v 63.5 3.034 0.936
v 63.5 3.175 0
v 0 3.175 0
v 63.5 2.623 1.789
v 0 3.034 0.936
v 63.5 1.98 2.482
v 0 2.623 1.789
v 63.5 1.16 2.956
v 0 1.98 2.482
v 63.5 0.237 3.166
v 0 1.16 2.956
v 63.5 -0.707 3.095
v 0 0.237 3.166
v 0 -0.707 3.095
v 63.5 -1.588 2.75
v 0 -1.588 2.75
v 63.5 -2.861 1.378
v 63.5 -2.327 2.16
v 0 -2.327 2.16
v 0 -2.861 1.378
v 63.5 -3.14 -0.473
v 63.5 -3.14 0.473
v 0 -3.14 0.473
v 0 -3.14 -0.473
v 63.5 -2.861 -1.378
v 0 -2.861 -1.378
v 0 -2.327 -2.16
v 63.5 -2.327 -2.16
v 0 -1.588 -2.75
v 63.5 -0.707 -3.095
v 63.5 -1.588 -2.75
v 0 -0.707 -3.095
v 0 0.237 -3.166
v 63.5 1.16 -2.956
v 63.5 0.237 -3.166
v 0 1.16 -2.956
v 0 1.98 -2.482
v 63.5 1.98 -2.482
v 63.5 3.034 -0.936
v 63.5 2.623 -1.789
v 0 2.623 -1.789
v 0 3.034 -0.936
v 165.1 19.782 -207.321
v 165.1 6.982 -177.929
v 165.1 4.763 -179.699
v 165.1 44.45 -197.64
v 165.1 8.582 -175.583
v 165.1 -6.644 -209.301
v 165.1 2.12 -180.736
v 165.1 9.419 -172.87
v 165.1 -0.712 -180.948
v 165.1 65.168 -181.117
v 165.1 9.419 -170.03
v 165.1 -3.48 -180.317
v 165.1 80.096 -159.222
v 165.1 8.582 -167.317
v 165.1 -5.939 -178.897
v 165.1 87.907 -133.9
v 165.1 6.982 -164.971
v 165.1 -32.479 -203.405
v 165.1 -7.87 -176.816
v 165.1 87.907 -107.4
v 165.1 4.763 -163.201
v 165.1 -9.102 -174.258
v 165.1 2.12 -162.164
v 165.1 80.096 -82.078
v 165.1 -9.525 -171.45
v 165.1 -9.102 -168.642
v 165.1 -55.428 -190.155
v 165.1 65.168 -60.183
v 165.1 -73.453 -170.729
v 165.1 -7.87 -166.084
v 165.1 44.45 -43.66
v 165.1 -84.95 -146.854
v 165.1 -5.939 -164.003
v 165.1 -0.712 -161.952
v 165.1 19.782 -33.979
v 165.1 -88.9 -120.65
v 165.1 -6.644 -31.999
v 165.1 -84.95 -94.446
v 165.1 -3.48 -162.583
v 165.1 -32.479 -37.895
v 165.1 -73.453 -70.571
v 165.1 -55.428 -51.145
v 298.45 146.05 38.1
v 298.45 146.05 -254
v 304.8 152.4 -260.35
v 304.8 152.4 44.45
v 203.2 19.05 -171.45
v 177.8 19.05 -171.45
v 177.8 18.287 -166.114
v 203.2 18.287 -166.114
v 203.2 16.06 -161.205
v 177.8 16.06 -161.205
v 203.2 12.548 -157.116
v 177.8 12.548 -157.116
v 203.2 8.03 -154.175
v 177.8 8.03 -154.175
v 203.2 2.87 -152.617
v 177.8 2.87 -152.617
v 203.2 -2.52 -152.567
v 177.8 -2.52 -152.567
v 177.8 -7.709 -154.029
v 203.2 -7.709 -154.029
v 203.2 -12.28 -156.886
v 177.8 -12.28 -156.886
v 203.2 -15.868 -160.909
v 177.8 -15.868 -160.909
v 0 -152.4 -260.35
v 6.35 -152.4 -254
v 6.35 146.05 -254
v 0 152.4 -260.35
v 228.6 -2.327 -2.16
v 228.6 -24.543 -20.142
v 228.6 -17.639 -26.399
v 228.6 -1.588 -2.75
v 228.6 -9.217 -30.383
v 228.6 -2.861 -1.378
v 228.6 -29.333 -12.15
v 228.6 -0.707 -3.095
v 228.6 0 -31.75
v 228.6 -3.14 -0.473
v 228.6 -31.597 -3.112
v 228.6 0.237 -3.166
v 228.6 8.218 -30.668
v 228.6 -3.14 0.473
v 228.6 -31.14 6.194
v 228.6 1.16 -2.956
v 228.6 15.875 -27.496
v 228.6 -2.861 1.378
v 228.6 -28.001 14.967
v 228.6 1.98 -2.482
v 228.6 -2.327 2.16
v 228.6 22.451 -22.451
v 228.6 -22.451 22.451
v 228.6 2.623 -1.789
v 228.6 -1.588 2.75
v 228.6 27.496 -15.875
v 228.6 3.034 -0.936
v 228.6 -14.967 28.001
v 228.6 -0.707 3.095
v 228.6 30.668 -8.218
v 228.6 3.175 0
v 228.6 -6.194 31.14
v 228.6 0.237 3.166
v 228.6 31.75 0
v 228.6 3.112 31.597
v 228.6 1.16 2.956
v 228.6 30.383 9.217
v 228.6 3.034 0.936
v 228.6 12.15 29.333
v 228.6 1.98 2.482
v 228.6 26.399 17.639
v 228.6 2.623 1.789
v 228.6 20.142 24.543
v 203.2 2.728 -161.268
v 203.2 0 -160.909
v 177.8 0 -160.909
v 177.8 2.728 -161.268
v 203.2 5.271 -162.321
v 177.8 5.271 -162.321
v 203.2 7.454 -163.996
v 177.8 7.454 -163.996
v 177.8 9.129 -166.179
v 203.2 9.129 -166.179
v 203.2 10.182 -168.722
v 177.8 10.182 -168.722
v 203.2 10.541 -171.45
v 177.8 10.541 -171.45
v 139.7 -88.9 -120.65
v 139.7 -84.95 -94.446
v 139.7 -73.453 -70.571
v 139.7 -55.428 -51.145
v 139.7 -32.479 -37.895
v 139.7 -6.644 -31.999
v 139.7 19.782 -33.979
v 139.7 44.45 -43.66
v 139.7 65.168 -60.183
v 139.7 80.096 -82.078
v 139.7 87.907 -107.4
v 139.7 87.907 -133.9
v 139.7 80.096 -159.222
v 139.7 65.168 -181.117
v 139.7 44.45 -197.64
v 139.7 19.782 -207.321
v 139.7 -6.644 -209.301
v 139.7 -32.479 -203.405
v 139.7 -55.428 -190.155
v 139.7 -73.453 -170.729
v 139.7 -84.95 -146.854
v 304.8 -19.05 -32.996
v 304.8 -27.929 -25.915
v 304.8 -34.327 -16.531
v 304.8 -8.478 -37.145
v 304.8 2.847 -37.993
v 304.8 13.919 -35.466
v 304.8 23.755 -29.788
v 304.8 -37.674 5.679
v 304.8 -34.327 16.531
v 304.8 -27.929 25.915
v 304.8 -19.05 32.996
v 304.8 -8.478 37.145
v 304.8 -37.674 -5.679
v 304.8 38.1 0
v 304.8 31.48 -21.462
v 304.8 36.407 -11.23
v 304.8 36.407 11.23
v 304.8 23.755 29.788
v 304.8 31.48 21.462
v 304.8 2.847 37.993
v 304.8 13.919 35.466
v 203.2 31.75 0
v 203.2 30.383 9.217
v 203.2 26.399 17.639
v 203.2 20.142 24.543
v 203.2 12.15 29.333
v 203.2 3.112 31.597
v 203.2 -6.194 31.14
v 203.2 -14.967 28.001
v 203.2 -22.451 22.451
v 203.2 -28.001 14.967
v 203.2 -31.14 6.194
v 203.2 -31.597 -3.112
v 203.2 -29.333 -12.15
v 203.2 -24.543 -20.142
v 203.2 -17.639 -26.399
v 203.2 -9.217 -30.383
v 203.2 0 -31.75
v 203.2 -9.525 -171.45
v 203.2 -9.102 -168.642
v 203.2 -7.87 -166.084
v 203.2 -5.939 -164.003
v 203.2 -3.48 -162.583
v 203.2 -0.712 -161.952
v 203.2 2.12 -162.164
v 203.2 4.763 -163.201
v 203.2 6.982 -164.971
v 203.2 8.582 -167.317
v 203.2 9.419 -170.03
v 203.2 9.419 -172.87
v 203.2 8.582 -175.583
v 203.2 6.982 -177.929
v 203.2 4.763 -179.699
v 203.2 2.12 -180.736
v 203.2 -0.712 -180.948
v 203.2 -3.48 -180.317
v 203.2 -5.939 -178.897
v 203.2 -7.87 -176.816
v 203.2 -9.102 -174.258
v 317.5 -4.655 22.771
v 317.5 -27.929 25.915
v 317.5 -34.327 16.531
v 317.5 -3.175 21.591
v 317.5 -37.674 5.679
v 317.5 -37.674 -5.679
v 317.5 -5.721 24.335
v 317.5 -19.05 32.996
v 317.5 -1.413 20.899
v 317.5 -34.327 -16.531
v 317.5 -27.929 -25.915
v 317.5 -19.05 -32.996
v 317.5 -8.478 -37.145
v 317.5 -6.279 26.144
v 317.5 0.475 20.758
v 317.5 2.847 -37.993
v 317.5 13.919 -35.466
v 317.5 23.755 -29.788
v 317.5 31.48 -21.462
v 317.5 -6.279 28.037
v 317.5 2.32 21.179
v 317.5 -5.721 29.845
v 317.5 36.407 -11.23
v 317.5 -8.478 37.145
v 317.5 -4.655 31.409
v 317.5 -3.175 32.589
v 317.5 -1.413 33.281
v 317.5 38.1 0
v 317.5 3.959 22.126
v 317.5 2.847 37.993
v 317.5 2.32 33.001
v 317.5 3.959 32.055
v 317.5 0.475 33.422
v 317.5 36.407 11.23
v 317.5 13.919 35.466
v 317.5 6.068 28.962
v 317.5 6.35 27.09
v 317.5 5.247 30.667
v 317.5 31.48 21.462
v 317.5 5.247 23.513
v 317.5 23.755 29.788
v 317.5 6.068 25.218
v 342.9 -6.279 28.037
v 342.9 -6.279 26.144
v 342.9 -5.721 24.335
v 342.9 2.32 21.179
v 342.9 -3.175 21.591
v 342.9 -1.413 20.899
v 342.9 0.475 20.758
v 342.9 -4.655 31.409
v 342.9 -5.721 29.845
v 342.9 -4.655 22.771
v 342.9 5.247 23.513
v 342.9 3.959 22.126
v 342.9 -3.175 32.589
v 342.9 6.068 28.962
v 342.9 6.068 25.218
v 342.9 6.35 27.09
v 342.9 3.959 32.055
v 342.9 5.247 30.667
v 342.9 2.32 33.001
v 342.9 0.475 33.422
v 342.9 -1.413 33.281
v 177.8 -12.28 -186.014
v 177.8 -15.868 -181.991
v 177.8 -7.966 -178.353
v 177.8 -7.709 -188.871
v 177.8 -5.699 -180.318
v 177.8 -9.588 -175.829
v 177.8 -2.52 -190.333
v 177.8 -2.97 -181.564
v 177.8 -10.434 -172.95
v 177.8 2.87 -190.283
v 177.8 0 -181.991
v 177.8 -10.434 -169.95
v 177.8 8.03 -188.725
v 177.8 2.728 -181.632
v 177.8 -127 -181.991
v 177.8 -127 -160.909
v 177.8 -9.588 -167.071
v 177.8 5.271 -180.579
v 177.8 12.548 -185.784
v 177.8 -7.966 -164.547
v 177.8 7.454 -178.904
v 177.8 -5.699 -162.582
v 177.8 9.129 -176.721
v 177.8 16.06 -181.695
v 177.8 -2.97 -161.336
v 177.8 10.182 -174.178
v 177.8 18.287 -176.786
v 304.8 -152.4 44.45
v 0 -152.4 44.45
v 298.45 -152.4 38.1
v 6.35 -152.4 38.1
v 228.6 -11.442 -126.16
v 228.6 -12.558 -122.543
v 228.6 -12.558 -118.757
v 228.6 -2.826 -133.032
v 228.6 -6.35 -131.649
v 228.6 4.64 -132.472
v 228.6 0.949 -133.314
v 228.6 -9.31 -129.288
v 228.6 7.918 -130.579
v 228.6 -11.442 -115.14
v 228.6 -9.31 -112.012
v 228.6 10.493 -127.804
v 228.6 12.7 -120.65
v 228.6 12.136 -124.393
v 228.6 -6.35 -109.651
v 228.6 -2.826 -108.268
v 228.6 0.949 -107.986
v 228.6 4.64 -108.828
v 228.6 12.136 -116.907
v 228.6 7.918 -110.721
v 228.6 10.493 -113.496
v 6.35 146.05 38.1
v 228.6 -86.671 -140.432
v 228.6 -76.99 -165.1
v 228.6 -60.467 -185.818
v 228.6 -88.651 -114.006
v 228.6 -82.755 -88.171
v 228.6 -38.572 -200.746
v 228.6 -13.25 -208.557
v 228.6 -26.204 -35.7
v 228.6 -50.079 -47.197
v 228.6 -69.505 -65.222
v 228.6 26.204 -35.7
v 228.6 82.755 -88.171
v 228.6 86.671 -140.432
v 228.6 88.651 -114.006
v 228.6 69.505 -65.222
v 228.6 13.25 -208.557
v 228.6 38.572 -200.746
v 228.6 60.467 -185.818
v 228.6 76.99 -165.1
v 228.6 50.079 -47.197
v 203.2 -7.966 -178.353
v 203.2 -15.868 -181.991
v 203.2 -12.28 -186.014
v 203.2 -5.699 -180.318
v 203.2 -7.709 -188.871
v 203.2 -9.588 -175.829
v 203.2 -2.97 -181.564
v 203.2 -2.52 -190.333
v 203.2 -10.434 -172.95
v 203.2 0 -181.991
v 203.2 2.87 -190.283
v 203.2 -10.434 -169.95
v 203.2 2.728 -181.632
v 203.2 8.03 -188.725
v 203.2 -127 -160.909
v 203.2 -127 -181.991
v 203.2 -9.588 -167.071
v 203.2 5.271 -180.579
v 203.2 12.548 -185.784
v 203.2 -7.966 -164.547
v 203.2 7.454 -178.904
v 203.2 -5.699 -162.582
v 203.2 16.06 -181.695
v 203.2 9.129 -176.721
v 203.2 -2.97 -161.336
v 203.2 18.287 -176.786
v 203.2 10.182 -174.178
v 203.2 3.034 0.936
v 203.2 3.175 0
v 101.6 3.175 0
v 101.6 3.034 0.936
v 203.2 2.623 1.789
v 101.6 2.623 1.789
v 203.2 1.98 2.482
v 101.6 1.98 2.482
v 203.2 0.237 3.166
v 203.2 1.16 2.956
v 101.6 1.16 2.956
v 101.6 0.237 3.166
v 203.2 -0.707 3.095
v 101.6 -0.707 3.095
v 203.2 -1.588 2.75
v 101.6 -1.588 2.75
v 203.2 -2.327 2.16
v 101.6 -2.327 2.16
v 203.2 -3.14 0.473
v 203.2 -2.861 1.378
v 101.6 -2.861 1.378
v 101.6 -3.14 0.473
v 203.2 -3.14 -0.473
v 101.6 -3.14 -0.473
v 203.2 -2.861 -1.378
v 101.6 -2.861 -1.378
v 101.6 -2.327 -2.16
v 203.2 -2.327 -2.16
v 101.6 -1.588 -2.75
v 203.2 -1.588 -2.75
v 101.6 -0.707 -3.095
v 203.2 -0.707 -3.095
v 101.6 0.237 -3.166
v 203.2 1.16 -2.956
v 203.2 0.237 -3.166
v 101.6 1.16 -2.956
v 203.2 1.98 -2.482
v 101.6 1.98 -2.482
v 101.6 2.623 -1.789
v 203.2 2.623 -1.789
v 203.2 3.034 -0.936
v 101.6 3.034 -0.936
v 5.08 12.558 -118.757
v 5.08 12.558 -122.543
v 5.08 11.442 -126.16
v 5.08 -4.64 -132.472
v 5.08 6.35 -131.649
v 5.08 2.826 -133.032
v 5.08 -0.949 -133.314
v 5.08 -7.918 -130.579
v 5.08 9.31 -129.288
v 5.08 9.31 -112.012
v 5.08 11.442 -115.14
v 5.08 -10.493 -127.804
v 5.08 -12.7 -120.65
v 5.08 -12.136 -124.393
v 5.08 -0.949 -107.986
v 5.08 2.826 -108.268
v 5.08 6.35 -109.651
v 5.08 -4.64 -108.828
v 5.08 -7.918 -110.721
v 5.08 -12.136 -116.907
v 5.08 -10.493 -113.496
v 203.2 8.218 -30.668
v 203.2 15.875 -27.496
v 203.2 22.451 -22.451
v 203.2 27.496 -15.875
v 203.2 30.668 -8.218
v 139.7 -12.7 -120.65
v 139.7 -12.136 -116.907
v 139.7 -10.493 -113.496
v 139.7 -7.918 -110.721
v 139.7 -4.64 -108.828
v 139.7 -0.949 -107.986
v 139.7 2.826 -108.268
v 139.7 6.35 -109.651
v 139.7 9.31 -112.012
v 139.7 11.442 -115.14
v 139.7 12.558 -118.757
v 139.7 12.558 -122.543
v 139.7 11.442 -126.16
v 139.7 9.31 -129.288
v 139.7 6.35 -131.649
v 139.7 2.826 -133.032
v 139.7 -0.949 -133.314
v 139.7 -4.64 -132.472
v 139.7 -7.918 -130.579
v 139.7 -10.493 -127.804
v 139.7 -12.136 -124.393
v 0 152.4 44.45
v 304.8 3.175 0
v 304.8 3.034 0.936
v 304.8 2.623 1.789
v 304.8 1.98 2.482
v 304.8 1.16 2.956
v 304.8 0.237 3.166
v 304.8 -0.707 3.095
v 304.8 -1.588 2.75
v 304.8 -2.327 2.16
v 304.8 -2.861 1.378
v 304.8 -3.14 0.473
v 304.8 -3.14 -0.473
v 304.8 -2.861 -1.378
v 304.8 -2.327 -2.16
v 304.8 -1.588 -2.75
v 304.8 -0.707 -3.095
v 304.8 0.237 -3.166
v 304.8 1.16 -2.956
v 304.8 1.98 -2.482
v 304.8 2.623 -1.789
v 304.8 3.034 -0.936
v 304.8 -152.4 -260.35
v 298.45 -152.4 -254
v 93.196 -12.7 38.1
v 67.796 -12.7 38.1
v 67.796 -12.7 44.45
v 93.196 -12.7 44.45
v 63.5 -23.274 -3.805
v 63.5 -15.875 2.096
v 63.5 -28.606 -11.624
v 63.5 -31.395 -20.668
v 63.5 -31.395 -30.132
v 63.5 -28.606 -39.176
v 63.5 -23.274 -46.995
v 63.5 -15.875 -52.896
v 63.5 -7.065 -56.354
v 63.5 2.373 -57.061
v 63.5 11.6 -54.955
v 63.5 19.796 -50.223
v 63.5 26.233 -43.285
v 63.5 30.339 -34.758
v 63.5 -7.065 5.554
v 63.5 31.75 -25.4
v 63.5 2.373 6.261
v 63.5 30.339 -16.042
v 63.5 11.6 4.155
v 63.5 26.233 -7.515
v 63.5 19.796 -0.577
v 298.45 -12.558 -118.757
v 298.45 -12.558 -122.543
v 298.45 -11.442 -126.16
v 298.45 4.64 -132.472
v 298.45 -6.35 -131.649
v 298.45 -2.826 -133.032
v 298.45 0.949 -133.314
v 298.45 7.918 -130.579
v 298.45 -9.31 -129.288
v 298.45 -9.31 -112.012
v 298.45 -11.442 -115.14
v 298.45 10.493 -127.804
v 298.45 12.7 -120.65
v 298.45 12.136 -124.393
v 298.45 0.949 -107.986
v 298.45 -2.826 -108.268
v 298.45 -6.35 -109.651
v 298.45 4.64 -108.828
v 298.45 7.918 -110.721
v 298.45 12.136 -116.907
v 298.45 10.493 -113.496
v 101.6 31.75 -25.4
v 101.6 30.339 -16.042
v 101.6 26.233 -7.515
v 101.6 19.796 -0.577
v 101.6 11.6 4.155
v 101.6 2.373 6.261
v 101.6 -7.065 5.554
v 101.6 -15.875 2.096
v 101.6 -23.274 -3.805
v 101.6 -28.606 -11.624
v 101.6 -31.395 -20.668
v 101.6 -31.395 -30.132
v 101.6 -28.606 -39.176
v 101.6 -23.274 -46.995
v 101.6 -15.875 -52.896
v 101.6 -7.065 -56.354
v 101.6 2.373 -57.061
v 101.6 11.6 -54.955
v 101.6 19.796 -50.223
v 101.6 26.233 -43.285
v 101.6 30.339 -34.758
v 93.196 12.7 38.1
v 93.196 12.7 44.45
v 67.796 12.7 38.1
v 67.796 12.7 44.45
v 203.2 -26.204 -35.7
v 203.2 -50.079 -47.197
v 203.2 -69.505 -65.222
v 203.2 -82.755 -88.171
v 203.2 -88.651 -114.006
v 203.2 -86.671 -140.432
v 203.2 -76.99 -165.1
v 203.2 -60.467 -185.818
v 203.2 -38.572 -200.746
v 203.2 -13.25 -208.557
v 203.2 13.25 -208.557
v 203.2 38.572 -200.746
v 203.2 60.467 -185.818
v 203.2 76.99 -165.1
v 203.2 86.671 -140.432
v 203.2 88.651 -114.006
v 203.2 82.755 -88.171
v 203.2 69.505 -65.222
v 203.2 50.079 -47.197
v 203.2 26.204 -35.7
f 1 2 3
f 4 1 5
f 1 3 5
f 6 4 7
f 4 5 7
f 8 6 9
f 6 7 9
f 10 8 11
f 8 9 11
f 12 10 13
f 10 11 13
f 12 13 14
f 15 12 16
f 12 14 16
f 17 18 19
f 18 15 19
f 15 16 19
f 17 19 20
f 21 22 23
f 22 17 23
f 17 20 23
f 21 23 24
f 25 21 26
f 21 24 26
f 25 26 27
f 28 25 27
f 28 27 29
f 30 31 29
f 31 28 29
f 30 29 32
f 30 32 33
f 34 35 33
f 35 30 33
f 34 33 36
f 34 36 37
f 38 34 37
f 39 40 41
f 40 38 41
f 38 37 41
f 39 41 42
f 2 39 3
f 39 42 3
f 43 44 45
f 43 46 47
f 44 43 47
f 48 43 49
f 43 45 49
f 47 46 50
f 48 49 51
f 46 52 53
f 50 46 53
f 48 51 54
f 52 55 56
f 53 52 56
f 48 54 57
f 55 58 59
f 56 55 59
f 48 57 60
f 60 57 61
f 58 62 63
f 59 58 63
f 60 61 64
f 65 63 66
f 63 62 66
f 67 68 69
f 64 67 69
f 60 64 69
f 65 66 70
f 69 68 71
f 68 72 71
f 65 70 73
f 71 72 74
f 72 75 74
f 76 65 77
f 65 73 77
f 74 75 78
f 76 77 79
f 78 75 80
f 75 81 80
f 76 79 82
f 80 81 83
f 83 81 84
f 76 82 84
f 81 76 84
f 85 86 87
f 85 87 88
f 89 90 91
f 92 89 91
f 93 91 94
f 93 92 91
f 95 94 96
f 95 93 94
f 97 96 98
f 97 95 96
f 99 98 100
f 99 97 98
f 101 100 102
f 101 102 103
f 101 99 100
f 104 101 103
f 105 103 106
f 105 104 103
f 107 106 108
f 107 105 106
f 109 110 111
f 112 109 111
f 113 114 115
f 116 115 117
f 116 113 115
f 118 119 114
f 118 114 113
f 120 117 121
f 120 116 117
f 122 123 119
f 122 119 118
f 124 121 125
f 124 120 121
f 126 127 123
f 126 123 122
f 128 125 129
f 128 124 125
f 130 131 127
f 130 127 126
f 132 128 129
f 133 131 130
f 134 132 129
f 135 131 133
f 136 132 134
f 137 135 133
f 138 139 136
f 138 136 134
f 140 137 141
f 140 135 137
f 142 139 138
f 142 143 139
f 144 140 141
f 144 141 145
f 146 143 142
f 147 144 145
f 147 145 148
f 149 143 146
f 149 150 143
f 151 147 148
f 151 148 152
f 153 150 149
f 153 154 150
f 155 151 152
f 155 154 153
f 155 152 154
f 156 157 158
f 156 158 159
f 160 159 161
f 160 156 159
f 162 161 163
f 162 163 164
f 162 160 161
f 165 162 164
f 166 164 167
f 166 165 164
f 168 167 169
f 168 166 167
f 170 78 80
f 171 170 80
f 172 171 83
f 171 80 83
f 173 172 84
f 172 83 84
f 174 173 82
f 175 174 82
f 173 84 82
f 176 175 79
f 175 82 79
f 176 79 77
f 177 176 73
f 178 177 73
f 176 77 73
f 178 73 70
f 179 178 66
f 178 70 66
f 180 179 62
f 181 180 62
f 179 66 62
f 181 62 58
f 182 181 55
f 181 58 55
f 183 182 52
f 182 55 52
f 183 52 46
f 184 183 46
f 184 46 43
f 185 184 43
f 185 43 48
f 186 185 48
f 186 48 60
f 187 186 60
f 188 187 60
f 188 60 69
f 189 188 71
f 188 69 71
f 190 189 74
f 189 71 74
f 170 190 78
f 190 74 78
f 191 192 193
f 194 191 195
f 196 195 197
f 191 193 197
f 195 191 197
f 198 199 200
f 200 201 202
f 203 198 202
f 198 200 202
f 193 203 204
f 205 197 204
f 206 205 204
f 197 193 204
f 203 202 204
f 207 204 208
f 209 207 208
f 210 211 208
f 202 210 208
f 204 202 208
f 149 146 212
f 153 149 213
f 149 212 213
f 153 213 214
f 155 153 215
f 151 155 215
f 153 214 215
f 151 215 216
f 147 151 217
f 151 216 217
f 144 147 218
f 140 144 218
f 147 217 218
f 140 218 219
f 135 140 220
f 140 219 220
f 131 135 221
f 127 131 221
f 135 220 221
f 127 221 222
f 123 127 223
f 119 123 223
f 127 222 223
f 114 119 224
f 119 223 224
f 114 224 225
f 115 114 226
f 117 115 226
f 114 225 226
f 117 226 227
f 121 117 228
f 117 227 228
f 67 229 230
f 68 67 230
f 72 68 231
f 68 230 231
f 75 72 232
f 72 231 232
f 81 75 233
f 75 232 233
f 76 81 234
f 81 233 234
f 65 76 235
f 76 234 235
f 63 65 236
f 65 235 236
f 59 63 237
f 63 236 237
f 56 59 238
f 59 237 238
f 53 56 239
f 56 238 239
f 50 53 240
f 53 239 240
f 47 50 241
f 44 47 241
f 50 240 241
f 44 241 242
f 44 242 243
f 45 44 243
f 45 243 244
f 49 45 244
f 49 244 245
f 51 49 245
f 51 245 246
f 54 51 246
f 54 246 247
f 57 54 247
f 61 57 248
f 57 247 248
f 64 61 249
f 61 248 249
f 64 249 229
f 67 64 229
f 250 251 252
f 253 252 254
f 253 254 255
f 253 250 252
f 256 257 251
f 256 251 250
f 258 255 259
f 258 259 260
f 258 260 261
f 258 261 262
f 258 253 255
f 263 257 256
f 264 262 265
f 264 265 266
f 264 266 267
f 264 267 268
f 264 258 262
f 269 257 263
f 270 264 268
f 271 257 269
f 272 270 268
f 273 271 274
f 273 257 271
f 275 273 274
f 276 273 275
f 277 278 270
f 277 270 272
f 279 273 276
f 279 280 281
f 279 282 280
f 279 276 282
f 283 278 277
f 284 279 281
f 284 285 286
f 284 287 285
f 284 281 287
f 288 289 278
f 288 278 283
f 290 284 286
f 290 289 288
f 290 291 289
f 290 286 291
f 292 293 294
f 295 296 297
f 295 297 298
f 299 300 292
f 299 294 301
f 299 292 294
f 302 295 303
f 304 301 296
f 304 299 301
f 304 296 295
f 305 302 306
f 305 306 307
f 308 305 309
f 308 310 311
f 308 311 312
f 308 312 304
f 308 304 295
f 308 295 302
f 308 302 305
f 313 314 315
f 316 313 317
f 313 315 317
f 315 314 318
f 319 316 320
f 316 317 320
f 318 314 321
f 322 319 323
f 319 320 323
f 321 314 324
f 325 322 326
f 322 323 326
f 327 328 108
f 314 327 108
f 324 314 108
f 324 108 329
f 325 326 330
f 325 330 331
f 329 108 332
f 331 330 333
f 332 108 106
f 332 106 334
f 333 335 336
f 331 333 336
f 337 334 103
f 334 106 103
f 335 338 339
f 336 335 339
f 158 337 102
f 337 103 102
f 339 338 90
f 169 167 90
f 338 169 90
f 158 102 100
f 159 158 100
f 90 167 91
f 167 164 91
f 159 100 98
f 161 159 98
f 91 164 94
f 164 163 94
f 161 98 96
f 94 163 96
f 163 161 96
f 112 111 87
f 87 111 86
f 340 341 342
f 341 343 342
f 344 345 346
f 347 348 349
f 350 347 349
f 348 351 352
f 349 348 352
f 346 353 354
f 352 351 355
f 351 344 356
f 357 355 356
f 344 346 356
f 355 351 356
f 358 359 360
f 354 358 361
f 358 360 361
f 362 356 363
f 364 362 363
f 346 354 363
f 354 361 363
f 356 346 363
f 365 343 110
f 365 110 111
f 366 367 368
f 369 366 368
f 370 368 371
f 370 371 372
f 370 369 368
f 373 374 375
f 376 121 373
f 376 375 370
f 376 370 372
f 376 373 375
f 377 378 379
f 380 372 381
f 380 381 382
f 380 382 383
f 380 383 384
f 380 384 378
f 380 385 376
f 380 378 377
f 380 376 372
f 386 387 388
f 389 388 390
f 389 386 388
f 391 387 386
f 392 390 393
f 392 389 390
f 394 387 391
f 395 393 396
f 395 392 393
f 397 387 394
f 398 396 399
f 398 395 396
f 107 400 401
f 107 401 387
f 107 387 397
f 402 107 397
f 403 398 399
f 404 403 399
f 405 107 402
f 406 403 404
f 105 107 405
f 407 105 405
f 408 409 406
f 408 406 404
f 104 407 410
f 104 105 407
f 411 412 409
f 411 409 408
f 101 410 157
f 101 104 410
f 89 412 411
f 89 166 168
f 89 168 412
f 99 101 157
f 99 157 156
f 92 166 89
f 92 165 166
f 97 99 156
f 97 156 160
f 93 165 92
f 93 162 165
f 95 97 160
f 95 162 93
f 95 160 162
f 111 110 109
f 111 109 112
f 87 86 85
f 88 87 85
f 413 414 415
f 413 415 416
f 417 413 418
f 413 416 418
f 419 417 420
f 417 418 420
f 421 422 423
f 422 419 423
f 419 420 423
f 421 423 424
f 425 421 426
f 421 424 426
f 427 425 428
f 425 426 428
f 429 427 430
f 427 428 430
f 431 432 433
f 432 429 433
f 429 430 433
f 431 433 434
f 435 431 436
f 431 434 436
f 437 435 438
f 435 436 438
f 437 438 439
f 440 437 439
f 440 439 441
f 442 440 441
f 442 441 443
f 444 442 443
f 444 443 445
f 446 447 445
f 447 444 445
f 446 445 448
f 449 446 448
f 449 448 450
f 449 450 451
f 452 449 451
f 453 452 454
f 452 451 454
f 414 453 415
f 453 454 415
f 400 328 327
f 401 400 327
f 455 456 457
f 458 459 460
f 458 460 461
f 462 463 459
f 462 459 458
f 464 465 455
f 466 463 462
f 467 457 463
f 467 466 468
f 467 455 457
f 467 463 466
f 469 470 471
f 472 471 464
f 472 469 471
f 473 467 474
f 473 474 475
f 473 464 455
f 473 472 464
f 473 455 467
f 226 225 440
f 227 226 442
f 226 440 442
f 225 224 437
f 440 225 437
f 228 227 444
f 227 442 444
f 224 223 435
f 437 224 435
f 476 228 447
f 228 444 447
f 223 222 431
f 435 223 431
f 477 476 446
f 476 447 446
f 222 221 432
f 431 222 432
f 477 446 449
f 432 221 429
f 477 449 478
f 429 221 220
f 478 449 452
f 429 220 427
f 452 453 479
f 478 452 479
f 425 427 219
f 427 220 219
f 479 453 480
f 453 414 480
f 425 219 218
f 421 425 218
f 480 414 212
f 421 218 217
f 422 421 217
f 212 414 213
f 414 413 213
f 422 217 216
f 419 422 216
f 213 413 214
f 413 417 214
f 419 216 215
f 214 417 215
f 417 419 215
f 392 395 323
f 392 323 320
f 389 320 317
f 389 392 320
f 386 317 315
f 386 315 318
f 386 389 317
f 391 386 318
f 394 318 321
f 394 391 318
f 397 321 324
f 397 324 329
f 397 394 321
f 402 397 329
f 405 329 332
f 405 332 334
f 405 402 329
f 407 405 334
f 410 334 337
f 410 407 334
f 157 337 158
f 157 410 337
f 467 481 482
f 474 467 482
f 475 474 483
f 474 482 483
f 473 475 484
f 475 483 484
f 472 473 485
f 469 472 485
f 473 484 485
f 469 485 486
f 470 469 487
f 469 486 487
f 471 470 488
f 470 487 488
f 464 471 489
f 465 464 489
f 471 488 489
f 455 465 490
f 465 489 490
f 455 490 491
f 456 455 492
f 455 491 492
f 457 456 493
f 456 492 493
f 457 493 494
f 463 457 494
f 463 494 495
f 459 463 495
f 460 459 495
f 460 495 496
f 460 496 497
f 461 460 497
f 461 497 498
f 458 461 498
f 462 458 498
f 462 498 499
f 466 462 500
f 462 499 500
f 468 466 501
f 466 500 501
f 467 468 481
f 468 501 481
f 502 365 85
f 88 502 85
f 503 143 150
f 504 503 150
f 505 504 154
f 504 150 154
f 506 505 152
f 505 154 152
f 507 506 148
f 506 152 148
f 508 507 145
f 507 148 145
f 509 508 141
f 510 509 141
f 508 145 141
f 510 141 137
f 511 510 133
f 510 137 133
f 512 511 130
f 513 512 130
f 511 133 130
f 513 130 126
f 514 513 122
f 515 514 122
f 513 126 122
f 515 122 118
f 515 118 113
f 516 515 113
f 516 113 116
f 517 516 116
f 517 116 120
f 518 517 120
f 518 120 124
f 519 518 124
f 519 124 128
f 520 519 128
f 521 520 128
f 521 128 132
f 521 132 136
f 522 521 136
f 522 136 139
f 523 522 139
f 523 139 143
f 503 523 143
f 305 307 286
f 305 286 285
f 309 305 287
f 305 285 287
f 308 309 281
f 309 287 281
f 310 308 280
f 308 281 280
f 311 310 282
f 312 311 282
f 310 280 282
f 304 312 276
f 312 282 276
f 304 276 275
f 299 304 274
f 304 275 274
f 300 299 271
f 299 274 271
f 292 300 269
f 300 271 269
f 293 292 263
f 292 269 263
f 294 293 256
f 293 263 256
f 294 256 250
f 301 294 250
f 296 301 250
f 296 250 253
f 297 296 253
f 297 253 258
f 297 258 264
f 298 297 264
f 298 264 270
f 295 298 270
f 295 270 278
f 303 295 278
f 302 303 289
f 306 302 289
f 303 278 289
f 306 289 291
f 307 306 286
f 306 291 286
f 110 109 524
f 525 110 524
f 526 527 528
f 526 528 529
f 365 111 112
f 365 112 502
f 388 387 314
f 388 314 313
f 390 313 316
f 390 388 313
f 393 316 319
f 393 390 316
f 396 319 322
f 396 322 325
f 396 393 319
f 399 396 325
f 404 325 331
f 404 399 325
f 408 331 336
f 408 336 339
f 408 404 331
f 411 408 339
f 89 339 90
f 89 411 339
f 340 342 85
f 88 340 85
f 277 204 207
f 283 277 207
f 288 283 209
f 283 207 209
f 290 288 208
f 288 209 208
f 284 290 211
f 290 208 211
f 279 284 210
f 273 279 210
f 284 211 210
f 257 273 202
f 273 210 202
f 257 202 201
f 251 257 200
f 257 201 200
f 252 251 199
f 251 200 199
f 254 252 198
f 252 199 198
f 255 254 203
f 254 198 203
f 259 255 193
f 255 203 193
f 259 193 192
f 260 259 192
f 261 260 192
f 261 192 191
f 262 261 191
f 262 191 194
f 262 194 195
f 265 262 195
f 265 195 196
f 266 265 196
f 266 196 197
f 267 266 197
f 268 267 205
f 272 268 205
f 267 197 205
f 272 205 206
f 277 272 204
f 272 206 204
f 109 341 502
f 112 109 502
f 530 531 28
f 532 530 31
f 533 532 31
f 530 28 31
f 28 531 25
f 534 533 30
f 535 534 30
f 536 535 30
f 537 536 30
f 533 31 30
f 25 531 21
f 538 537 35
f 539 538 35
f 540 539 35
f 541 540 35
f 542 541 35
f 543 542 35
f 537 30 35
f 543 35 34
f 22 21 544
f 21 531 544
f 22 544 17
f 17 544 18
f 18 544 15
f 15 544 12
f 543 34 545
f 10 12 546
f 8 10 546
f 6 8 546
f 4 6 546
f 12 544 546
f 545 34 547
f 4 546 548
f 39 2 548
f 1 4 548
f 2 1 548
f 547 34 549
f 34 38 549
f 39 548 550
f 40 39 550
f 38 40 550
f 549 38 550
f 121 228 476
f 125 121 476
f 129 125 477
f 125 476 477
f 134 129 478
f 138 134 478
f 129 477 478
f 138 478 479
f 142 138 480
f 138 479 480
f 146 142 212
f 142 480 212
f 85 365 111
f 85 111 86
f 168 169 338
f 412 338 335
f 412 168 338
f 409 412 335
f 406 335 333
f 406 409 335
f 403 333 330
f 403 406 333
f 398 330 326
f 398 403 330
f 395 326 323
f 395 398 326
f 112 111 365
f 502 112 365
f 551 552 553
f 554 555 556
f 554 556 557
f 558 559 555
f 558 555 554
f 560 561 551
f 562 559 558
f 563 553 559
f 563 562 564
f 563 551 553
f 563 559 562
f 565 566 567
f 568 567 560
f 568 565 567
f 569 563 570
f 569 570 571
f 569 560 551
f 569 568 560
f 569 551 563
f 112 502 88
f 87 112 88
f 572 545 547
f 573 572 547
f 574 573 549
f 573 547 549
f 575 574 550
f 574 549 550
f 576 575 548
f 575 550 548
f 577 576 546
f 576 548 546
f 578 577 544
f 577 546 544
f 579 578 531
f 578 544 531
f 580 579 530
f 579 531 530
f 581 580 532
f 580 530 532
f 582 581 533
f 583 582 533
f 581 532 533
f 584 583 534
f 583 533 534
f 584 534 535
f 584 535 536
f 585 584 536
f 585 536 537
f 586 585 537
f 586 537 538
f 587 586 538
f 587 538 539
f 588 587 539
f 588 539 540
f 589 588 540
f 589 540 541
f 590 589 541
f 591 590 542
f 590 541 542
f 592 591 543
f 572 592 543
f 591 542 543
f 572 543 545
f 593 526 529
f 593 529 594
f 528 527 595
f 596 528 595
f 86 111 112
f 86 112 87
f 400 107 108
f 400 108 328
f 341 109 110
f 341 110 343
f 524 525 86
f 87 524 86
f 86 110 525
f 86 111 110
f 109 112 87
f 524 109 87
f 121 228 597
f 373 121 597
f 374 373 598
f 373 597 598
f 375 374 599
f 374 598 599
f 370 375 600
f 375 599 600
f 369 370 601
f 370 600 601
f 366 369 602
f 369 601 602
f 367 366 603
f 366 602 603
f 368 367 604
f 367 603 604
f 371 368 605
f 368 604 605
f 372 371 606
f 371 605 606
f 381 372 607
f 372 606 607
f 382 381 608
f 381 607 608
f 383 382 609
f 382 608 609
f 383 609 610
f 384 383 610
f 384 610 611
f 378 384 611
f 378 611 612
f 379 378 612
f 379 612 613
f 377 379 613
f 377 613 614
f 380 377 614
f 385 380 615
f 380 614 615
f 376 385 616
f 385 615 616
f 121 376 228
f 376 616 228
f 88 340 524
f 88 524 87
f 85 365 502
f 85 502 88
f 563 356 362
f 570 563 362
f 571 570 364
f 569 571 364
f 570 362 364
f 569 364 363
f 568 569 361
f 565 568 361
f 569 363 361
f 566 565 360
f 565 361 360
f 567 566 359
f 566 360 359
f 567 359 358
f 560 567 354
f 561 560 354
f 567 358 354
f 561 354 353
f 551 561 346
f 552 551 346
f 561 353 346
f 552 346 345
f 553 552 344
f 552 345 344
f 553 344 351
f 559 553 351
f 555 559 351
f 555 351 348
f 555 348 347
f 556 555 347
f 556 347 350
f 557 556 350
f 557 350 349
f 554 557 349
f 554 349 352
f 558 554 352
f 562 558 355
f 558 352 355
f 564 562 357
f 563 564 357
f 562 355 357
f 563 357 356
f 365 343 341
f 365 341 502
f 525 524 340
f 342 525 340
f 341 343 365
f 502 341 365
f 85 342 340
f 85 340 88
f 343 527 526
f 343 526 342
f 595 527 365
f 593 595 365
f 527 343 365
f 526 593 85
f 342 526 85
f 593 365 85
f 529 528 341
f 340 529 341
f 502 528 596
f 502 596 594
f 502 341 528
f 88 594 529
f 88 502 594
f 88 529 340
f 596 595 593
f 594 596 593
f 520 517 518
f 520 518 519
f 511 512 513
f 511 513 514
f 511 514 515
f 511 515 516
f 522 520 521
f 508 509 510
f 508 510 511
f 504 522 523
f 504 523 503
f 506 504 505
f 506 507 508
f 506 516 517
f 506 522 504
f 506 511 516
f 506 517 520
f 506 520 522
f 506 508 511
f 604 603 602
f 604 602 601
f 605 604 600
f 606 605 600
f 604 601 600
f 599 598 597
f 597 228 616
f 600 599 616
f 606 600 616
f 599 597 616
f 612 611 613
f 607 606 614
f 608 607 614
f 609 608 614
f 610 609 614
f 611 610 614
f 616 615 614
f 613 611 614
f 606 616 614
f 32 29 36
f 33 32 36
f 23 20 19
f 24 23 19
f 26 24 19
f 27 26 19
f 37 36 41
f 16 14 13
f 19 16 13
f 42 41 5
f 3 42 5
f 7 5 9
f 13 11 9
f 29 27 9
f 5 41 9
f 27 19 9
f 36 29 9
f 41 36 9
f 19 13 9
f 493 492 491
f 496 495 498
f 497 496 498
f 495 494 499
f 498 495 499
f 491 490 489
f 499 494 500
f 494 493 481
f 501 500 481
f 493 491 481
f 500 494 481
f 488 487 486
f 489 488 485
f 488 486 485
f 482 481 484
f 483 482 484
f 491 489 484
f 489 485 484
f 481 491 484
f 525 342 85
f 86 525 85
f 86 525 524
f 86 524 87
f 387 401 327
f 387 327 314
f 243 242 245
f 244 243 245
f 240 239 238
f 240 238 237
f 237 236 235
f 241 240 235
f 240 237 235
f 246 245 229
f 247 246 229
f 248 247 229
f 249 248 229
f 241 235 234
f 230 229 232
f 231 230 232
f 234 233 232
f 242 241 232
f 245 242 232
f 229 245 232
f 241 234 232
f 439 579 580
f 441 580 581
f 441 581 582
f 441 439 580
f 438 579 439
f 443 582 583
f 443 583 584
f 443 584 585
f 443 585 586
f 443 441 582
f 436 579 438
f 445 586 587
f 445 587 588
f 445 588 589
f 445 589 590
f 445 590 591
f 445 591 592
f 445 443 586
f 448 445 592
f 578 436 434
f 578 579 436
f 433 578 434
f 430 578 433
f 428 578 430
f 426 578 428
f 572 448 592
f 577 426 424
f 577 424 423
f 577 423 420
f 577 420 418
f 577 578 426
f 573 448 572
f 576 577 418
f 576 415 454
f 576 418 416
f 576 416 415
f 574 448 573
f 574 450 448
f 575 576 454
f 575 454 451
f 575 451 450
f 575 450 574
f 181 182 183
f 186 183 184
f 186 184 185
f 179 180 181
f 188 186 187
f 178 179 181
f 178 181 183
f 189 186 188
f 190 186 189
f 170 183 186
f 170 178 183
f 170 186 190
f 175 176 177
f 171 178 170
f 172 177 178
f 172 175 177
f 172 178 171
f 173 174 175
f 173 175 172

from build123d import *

# Parameters (mm, degrees)
F0_R      = 3.175
F1_DEPTH  = 304.8
F3_R      = 31.75
F4_DEPTH  = 38.1
F6_W      = 304.8
F6_H      = 304.8
F6_W_2    = 25.4
F6_H_2    = 25.4
F7_DEPTH  = 6.35
F8_SIZE   = 6.34999
F9_W      = 304.8
F9_H      = 304.8
F10_DEPTH = 6.35
F11_SIZE  = 6.34999
F13_W     = 304.8
F13_H     = 304.8
F14_DEPTH = 6.35
F15_SIZE  = 6.34999
F17_W     = 304.8
F17_H     = 304.8
F18_DEPTH = 6.35
F19_SIZE  = 6.34999
F22_DEPTH = 25.4
F23_R     = 9.525
F24_DEPTH = 38.1
F26_W     = 304.8
F26_H     = 304.8
F27_DEPTH = 6.35
F28_SIZE  = 6.34999
F29_R     = 38.1
F30_DEPTH = 12.7
F31_R     = 6.35
F32_DEPTH = 25.4
F33_R     = 12.7
F34_DEPTH = 69.85
F36_R     = 88.9
F37_DEPTH = 25.4
F38_R     = 12.7
F39_DEPTH = 134.62
F41_DEPTH = 25.4


# Not quite as in the source:
# - a fillet or chamfer is up to 0.001 mm smaller than in the source, because OpenCascade refuses the exact size
# - a feature of the source that left no trace in its solid (it failed there, or was rolled back) is left out


with BuildPart() as f1:
    # F0 (on Right) → F1 (new body)
    with BuildSketch(Plane.YZ):
        Circle(F0_R)
    extrude(amount=F1_DEPTH)

    # F3 (on offset) → F4 (join)
    with BuildSketch(Plane.YZ.offset(63.5)):
        with Locations((0, -25.4)):
            Circle(F3_R)
    extrude(amount=F4_DEPTH)

    # F21 (on offset) → F22, piece 2 (join)
    with BuildSketch(Plane.YZ.offset(203.2)):
        with BuildLine():
            ThreePointArc((-9.51e-08, -31.75), (22.4506402691, -22.4506403363), (31.75, 0))
            ThreePointArc((31.75, 0), (-22.4506402691, 22.4506403363), (-9.51e-08, -31.75))
        make_face()
    extrude(amount=F22_DEPTH)


with BuildPart() as f7:
    # F6 (on offset) → F7 (new body)
    with BuildSketch(Plane.XY.offset(38.1)):
        with Locations((152.4, 0)):
            Rectangle(F6_W, F6_H)
        with Locations((80.4958567023, 0)):
            Rectangle(F6_W_2, F6_H_2, mode=Mode.SUBTRACT)
    extrude(amount=F7_DEPTH)

    # F8 (size 6.35 in the source; OpenCascade refuses exactly that, so slightly less here)
    f8_edges = [f7.edges().sort_by_distance(p)[0] for p in [
        (304.8, 0, 38.1),
        (152.4, 152.4, 38.1),
        (0, 0, 38.1),
    ]]
    chamfer(f8_edges, length=F8_SIZE)


with BuildPart() as f10:
    # F9 (on Right) → F10 (new body)
    with BuildSketch(Plane.YZ):
        with Locations((0, -107.95)):
            Rectangle(F9_W, F9_H)
    extrude(amount=F10_DEPTH)

    # F11 (size 6.35 in the source; OpenCascade refuses exactly that, so slightly less here)
    f11_edges = [f10.edges().sort_by_distance(p)[0] for p in [
        (6.35, 0, 44.45),
        (6.35, 0, -260.35),
        (6.35, 152.4, -107.95),
    ]]
    chamfer(f11_edges, length=F11_SIZE)


with BuildPart() as f14:
    # F13 (on offset) → F14 (new body)
    with BuildSketch(Plane.XZ.offset(-152.4)):
        with Locations((152.4, -107.95)):
            Rectangle(F13_W, F13_H)
    extrude(amount=F14_DEPTH)

    # F15 (size 6.35 in the source; OpenCascade refuses exactly that, so slightly less here)
    f15_edges = [f14.edges().sort_by_distance(p)[0] for p in [
        (152.4, 146.05, 44.45),
        (304.8, 146.05, -107.95),
        (152.4, 146.05, -260.35),
        (0, 146.05, -107.95),
    ]]
    chamfer(f15_edges, length=F15_SIZE)


with BuildPart() as f18:
    # F17 (on offset) → F18 (new body)
    with BuildSketch(Plane.XY.offset(-260.35)):
        with Locations((152.4, 0)):
            Rectangle(F17_W, F17_H)
    extrude(amount=F18_DEPTH)

    # F19 (size 6.35 in the source; OpenCascade refuses exactly that, so slightly less here)
    f19_edges = [f18.edges().sort_by_distance(p)[0] for p in [
        (0, 0, -254),
        (152.4, 152.4, -254),
        (304.8, 0, -254),
    ]]
    chamfer(f19_edges, length=F19_SIZE)


with BuildPart() as f22:
    # F21 (on offset) → F22 (new body)
    with BuildSketch(Plane.YZ.offset(203.2)):
        with BuildLine():
            ThreePointArc((88.9, -120.65), (62.8617928139, -57.7882071189), (-9.51e-08, -31.75))
            ThreePointArc((-9.51e-08, -31.75), (-62.8617928139, -183.5117928811), (88.9, -120.65))
        make_face()
    extrude(amount=F22_DEPTH)


with BuildPart() as f24:
    # F23 (on face) → F24 (new body)
    with BuildSketch(Plane(origin=(203.2, 0, 0), x_dir=(0, -1, 0), z_dir=(-1, 0, 0))):
        with Locations((0, -171.45)):
            Circle(F23_R)
    extrude(amount=F24_DEPTH)

    # F36 (on offset) → F37 (join)
    with BuildSketch(Plane(origin=(165.1, 0, 0), x_dir=(0, -1, 0), z_dir=(-1, 0, 0))):
        with Locations((0, -120.65)):
            Circle(F36_R)
    extrude(amount=F37_DEPTH)


with BuildPart() as f27:
    # F26 (on offset) → F27 (new body)
    with BuildSketch(Plane.YZ.offset(304.8)):
        with Locations((0, -107.95)):
            Rectangle(F26_W, F26_H)
    extrude(amount=-F27_DEPTH)

    # F28 (size 6.35 in the source; OpenCascade refuses exactly that, so slightly less here)
    f28_edges = [f27.edges().sort_by_distance(p)[0] for p in [
        (298.45, 0, 44.45),
        (298.45, 152.4, -107.95),
        (298.45, 0, -260.35),
    ]]
    chamfer(f28_edges, length=F28_SIZE)


with BuildPart() as f30:
    # F29 (on face) → F30 (new body)
    with BuildSketch(Plane.YZ.offset(304.8)):
        Circle(F29_R)
    extrude(amount=F30_DEPTH)

    # F31 (on face) → F32 (join)
    with BuildSketch(Plane.YZ.offset(317.5)):
        with Locations((0, 27.0901415497)):
            Circle(F31_R)
    extrude(amount=F32_DEPTH)


with BuildPart() as f34:
    # F33 (on face) → F34 (new body)
    with BuildSketch(Plane.YZ.offset(228.6)):
        with Locations((0, -120.65)):
            Circle(F33_R)
    extrude(amount=F34_DEPTH)


with BuildPart() as f39:
    # F38 (on face) → F39 (new body)
    with BuildSketch(Plane(origin=(139.7, 0, 0), x_dir=(0, -1, 0), z_dir=(-1, 0, 0))):
        with Locations((0, -120.65)):
            Circle(F38_R)
    extrude(amount=F39_DEPTH)


with BuildPart() as f41:
    # F40 (on face) → F41 (new body)
    with BuildSketch(Plane.YZ.offset(203.2)):
        with BuildLine():
            ThreePointArc((-15.8678864062, -181.991), (-19.05, -171.45), (-15.8678864062, -160.909))
            Line((-15.8678864062, -160.909), (-127, -160.909))
            Line((-127, -160.909), (-127, -181.991))
            Line((-127, -181.991), (-15.8678864062, -181.991))
        make_face()
        with BuildLine():
            Line((0, -160.909), (-15.8678864062, -160.909))
            ThreePointArc((-15.8678864062, -160.909), (-19.05, -171.45), (-15.8678864062, -181.991))
            Line((-15.8678864062, -181.991), (0, -181.991))
            ThreePointArc((0, -181.991), (-10.541, -171.45), (0, -160.909))
        make_face()
        with BuildLine():
            ThreePointArc((-15.8678864062, -181.991), (5.5054184202, -189.6871288316), (19.05, -171.45))
            ThreePointArc((19.05, -171.45), (5.5054184202, -153.2128711684), (-15.8678864062, -160.909))
            Line((-15.8678864062, -160.909), (0, -160.909))
            ThreePointArc((0, -160.909), (7.4536125805, -163.9963874195), (10.541, -171.45))
            ThreePointArc((10.541, -171.45), (7.4536125805, -178.9036125805), (0, -181.991))
            Line((0, -181.991), (-15.8678864062, -181.991))
        make_face()
    extrude(amount=-F41_DEPTH)


solid = Compound([f1.part, f7.part, f10.part, f14.part, f18.part, f22.part, f24.part, f27.part, f30.part, f34.part, f39.part, f41.part])
